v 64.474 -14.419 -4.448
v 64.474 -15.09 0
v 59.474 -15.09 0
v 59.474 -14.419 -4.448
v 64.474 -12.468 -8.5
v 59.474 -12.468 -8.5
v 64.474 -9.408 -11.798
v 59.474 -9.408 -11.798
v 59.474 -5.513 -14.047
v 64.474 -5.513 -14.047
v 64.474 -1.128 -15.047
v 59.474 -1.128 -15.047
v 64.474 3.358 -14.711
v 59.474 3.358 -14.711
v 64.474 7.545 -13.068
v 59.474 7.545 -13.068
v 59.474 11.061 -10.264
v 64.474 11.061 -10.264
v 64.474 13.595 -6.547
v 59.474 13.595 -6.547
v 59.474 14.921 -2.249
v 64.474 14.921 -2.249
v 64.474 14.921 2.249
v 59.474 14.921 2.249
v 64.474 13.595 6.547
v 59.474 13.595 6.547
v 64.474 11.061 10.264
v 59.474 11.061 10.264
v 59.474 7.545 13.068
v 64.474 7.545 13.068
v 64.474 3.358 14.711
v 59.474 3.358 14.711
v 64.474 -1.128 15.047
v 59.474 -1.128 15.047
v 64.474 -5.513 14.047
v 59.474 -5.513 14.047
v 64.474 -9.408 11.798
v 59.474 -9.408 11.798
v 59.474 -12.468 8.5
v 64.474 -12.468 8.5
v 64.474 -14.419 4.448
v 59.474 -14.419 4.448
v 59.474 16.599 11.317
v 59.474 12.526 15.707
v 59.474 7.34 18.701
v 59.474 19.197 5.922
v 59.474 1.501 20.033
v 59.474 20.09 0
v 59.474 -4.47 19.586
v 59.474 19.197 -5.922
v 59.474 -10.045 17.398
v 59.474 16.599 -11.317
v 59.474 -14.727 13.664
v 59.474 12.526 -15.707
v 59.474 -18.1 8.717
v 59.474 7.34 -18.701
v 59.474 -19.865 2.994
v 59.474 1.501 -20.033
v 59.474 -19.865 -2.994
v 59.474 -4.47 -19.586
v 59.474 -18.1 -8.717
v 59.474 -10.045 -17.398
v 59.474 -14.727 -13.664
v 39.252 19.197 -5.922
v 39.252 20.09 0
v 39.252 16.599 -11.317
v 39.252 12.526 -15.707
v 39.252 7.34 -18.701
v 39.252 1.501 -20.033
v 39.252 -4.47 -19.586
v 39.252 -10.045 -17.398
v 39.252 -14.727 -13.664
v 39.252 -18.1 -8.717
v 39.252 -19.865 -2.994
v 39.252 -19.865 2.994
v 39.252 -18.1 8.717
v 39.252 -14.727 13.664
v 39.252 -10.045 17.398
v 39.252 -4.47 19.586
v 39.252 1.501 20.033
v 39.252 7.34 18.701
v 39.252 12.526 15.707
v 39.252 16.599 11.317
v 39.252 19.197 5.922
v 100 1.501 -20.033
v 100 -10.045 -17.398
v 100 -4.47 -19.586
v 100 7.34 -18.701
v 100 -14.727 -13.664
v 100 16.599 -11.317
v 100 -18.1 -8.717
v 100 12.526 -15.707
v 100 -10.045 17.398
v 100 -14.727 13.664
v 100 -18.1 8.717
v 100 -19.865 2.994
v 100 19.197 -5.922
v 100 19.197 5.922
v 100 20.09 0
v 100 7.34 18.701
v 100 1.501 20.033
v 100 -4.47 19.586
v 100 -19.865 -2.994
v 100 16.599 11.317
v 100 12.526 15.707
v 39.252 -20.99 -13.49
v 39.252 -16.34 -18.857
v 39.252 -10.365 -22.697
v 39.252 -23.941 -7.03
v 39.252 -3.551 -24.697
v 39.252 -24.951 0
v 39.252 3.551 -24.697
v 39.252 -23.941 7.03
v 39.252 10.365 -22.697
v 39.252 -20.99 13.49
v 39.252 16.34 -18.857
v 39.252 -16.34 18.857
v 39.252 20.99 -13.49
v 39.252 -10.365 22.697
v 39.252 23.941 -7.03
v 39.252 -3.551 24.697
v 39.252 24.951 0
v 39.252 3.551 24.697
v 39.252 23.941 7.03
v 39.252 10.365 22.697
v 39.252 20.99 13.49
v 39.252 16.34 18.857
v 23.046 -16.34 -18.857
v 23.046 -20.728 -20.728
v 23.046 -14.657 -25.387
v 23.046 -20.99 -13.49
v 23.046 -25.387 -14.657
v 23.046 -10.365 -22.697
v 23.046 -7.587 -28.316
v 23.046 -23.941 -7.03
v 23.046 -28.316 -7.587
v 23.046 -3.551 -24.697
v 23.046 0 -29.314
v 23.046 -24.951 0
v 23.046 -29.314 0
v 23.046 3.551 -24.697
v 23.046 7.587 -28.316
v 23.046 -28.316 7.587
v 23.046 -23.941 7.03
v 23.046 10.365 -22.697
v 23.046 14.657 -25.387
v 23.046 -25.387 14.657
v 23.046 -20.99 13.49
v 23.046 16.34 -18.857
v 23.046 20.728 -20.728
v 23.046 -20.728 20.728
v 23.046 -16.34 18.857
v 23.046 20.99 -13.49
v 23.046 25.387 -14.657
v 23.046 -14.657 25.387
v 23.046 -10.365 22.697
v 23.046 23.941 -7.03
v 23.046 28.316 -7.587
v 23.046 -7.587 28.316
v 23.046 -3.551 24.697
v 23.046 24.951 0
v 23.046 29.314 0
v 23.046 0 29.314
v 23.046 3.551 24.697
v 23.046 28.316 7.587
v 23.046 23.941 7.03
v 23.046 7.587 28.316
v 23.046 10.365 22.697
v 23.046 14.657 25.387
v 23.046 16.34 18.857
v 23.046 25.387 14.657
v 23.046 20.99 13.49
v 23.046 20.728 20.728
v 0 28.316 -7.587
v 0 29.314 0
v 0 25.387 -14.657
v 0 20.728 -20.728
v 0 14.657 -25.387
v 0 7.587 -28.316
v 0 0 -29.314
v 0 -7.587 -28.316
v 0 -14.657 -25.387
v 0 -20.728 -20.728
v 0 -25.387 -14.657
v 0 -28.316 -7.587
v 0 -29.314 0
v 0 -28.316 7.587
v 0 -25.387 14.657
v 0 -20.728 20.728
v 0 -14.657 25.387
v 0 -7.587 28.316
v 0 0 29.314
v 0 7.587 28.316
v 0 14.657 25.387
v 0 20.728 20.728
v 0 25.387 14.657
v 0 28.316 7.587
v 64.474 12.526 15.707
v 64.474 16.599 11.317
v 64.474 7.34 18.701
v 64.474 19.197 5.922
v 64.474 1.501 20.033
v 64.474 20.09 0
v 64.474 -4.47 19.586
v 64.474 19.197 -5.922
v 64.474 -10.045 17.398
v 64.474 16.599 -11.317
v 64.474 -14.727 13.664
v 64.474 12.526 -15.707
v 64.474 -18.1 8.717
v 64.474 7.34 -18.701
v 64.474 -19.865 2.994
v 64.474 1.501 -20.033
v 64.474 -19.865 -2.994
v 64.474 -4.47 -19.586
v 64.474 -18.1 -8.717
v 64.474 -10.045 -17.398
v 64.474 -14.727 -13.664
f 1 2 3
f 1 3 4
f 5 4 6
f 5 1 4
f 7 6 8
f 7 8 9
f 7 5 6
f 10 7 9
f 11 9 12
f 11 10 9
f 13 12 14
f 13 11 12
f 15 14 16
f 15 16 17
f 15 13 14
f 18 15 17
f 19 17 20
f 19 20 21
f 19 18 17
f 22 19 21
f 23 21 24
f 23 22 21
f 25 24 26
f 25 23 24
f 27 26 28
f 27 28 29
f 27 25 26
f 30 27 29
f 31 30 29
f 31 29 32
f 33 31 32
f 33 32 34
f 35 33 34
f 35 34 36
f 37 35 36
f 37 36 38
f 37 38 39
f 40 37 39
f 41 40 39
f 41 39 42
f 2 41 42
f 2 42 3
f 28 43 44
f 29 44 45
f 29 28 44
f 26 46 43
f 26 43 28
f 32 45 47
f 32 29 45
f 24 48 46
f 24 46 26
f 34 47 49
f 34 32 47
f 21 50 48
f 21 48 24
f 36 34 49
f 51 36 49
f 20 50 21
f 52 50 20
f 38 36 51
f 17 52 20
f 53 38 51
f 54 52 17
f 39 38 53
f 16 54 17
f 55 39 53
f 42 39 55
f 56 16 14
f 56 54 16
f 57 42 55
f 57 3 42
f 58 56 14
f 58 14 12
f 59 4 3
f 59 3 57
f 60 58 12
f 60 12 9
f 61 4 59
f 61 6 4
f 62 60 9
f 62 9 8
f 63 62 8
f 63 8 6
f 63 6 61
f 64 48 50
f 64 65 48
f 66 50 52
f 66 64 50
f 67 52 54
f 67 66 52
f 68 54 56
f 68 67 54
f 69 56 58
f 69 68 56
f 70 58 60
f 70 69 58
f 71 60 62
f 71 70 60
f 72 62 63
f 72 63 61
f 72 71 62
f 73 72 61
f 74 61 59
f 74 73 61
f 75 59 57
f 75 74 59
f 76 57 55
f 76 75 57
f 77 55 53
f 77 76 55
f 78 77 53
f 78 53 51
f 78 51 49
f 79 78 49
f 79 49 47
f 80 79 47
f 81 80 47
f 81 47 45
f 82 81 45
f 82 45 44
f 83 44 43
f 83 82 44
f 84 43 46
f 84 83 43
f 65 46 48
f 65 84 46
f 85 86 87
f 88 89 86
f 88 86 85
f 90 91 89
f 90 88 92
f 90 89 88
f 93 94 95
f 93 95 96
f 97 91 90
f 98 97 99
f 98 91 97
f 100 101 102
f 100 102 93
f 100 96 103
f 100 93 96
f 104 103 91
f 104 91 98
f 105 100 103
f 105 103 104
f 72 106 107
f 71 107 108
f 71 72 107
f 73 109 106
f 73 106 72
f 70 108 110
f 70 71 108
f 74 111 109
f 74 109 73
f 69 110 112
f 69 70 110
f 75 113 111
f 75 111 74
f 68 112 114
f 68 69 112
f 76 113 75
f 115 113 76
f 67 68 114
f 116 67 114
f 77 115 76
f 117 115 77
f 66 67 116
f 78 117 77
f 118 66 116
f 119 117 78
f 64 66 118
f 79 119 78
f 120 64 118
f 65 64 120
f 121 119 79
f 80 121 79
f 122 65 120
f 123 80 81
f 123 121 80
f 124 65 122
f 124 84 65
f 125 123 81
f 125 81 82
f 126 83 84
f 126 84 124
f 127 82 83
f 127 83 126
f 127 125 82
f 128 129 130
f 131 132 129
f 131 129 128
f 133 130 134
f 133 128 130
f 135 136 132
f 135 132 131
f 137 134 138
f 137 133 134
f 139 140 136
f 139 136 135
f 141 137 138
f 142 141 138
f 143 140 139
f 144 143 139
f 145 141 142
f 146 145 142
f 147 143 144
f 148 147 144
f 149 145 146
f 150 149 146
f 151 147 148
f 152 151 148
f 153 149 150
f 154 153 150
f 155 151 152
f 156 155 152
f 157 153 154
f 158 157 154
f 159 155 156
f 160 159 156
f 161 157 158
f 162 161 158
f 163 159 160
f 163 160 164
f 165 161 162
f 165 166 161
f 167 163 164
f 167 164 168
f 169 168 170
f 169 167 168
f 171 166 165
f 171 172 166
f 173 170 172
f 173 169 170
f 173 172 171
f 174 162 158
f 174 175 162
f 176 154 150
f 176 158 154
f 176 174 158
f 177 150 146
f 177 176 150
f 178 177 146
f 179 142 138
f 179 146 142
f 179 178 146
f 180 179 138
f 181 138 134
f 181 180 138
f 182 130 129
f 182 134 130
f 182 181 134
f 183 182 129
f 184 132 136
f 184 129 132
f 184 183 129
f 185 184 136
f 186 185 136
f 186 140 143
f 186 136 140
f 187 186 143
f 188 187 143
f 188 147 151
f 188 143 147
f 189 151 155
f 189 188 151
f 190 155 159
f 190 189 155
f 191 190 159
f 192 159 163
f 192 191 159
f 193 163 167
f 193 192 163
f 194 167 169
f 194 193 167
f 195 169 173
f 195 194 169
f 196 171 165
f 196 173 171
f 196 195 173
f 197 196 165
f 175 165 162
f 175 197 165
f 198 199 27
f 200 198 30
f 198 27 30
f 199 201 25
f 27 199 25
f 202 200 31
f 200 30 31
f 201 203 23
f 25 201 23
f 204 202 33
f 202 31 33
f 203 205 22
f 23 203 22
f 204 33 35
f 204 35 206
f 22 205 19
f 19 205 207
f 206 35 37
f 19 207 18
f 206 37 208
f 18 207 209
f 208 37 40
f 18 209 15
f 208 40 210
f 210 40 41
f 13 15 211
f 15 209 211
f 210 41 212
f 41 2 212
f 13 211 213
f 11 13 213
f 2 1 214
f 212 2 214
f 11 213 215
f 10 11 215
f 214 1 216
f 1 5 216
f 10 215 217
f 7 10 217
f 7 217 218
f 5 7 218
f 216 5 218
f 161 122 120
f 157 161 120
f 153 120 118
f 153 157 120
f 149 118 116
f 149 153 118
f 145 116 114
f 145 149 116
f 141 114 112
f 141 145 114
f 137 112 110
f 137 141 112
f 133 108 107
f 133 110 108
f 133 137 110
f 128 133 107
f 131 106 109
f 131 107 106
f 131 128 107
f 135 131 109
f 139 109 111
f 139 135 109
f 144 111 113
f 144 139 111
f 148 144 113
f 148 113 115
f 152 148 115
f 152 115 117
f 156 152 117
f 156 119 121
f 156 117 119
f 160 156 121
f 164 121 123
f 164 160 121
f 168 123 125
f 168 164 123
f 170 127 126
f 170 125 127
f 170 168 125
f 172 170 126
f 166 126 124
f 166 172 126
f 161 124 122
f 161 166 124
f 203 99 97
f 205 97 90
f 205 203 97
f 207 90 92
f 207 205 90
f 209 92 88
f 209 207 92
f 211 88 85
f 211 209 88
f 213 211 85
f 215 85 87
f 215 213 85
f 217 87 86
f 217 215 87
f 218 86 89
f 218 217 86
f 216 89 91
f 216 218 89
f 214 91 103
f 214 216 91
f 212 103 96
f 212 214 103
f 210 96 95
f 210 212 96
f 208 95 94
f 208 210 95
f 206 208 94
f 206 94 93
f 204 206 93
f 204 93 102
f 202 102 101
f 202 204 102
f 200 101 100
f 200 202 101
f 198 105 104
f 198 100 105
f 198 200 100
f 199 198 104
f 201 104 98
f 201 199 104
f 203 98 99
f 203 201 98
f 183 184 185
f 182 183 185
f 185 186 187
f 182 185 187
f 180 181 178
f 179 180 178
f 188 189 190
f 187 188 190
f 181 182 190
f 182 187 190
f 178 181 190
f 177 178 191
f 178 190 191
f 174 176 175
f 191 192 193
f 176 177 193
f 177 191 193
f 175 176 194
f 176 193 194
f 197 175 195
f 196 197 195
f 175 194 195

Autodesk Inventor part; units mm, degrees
ref_plane "YZ Plane" through (0, 0, 0) normal (1, 0, 0) x (0, 1, 0)
ref_plane "XZ Plane" through (0, 0, 0) normal (0, 1, 0) x (-1, 0, 0)
ref_plane "XY Plane" through (0, 0, 0) normal (0, 0, 1) x (1, 0, 0)
sketch "Эскиз1" plane through (0, 0, 0) normal (0, 0, 1) x (1, 0, 0)
  line L0 (0, 0) -> (100, 0)
  line L1 (100, 0) -> (100, 20.0896)
  line L2 (100, 20.0896) -> (39.2522, 20.0896)
  line L3 (39.2522, 20.0896) -> (39.2522, 24.9514)
  line L4 (39.2522, 24.9514) -> (23.0464, 24.9514)
  line L5 (23.0464, 24.9514) -> (23.0464, 29.3145)
  line L6 (23.0464, 29.3145) -> (0, 29.3145)
  line L7 (0, 29.3145) -> (0, 0)
  line L8 (59.4742, 20.0896) -> (59.4742, 15.0896)
  line L9 (59.4742, 15.0896) -> (64.4742, 15.0896)
  line L10 (64.4742, 15.0896) -> (64.4742, 20.0896)
  dimension "d0" = 100
  dimension "d2" = 5
  dimension "d3" = 5
revolve "Вращение1" add sketch "Эскиз1" angle 360 about axis through (0, 0, 0) along (1, 0, 0)
revolve "Вращение2" add sketch "Эскиз1" angle 360 about axis through (0, 0, 0) along (1, 0, 0) contours L10 L9 L8 L2
revolve "Вращение3" cut sketch "Эскиз1" angle 360 mid plane about axis through (0, 0, 0) along (1, 0, 0) contours L10 L9 L8 L2
properties part number "lab_4_1" material "Серебро"
